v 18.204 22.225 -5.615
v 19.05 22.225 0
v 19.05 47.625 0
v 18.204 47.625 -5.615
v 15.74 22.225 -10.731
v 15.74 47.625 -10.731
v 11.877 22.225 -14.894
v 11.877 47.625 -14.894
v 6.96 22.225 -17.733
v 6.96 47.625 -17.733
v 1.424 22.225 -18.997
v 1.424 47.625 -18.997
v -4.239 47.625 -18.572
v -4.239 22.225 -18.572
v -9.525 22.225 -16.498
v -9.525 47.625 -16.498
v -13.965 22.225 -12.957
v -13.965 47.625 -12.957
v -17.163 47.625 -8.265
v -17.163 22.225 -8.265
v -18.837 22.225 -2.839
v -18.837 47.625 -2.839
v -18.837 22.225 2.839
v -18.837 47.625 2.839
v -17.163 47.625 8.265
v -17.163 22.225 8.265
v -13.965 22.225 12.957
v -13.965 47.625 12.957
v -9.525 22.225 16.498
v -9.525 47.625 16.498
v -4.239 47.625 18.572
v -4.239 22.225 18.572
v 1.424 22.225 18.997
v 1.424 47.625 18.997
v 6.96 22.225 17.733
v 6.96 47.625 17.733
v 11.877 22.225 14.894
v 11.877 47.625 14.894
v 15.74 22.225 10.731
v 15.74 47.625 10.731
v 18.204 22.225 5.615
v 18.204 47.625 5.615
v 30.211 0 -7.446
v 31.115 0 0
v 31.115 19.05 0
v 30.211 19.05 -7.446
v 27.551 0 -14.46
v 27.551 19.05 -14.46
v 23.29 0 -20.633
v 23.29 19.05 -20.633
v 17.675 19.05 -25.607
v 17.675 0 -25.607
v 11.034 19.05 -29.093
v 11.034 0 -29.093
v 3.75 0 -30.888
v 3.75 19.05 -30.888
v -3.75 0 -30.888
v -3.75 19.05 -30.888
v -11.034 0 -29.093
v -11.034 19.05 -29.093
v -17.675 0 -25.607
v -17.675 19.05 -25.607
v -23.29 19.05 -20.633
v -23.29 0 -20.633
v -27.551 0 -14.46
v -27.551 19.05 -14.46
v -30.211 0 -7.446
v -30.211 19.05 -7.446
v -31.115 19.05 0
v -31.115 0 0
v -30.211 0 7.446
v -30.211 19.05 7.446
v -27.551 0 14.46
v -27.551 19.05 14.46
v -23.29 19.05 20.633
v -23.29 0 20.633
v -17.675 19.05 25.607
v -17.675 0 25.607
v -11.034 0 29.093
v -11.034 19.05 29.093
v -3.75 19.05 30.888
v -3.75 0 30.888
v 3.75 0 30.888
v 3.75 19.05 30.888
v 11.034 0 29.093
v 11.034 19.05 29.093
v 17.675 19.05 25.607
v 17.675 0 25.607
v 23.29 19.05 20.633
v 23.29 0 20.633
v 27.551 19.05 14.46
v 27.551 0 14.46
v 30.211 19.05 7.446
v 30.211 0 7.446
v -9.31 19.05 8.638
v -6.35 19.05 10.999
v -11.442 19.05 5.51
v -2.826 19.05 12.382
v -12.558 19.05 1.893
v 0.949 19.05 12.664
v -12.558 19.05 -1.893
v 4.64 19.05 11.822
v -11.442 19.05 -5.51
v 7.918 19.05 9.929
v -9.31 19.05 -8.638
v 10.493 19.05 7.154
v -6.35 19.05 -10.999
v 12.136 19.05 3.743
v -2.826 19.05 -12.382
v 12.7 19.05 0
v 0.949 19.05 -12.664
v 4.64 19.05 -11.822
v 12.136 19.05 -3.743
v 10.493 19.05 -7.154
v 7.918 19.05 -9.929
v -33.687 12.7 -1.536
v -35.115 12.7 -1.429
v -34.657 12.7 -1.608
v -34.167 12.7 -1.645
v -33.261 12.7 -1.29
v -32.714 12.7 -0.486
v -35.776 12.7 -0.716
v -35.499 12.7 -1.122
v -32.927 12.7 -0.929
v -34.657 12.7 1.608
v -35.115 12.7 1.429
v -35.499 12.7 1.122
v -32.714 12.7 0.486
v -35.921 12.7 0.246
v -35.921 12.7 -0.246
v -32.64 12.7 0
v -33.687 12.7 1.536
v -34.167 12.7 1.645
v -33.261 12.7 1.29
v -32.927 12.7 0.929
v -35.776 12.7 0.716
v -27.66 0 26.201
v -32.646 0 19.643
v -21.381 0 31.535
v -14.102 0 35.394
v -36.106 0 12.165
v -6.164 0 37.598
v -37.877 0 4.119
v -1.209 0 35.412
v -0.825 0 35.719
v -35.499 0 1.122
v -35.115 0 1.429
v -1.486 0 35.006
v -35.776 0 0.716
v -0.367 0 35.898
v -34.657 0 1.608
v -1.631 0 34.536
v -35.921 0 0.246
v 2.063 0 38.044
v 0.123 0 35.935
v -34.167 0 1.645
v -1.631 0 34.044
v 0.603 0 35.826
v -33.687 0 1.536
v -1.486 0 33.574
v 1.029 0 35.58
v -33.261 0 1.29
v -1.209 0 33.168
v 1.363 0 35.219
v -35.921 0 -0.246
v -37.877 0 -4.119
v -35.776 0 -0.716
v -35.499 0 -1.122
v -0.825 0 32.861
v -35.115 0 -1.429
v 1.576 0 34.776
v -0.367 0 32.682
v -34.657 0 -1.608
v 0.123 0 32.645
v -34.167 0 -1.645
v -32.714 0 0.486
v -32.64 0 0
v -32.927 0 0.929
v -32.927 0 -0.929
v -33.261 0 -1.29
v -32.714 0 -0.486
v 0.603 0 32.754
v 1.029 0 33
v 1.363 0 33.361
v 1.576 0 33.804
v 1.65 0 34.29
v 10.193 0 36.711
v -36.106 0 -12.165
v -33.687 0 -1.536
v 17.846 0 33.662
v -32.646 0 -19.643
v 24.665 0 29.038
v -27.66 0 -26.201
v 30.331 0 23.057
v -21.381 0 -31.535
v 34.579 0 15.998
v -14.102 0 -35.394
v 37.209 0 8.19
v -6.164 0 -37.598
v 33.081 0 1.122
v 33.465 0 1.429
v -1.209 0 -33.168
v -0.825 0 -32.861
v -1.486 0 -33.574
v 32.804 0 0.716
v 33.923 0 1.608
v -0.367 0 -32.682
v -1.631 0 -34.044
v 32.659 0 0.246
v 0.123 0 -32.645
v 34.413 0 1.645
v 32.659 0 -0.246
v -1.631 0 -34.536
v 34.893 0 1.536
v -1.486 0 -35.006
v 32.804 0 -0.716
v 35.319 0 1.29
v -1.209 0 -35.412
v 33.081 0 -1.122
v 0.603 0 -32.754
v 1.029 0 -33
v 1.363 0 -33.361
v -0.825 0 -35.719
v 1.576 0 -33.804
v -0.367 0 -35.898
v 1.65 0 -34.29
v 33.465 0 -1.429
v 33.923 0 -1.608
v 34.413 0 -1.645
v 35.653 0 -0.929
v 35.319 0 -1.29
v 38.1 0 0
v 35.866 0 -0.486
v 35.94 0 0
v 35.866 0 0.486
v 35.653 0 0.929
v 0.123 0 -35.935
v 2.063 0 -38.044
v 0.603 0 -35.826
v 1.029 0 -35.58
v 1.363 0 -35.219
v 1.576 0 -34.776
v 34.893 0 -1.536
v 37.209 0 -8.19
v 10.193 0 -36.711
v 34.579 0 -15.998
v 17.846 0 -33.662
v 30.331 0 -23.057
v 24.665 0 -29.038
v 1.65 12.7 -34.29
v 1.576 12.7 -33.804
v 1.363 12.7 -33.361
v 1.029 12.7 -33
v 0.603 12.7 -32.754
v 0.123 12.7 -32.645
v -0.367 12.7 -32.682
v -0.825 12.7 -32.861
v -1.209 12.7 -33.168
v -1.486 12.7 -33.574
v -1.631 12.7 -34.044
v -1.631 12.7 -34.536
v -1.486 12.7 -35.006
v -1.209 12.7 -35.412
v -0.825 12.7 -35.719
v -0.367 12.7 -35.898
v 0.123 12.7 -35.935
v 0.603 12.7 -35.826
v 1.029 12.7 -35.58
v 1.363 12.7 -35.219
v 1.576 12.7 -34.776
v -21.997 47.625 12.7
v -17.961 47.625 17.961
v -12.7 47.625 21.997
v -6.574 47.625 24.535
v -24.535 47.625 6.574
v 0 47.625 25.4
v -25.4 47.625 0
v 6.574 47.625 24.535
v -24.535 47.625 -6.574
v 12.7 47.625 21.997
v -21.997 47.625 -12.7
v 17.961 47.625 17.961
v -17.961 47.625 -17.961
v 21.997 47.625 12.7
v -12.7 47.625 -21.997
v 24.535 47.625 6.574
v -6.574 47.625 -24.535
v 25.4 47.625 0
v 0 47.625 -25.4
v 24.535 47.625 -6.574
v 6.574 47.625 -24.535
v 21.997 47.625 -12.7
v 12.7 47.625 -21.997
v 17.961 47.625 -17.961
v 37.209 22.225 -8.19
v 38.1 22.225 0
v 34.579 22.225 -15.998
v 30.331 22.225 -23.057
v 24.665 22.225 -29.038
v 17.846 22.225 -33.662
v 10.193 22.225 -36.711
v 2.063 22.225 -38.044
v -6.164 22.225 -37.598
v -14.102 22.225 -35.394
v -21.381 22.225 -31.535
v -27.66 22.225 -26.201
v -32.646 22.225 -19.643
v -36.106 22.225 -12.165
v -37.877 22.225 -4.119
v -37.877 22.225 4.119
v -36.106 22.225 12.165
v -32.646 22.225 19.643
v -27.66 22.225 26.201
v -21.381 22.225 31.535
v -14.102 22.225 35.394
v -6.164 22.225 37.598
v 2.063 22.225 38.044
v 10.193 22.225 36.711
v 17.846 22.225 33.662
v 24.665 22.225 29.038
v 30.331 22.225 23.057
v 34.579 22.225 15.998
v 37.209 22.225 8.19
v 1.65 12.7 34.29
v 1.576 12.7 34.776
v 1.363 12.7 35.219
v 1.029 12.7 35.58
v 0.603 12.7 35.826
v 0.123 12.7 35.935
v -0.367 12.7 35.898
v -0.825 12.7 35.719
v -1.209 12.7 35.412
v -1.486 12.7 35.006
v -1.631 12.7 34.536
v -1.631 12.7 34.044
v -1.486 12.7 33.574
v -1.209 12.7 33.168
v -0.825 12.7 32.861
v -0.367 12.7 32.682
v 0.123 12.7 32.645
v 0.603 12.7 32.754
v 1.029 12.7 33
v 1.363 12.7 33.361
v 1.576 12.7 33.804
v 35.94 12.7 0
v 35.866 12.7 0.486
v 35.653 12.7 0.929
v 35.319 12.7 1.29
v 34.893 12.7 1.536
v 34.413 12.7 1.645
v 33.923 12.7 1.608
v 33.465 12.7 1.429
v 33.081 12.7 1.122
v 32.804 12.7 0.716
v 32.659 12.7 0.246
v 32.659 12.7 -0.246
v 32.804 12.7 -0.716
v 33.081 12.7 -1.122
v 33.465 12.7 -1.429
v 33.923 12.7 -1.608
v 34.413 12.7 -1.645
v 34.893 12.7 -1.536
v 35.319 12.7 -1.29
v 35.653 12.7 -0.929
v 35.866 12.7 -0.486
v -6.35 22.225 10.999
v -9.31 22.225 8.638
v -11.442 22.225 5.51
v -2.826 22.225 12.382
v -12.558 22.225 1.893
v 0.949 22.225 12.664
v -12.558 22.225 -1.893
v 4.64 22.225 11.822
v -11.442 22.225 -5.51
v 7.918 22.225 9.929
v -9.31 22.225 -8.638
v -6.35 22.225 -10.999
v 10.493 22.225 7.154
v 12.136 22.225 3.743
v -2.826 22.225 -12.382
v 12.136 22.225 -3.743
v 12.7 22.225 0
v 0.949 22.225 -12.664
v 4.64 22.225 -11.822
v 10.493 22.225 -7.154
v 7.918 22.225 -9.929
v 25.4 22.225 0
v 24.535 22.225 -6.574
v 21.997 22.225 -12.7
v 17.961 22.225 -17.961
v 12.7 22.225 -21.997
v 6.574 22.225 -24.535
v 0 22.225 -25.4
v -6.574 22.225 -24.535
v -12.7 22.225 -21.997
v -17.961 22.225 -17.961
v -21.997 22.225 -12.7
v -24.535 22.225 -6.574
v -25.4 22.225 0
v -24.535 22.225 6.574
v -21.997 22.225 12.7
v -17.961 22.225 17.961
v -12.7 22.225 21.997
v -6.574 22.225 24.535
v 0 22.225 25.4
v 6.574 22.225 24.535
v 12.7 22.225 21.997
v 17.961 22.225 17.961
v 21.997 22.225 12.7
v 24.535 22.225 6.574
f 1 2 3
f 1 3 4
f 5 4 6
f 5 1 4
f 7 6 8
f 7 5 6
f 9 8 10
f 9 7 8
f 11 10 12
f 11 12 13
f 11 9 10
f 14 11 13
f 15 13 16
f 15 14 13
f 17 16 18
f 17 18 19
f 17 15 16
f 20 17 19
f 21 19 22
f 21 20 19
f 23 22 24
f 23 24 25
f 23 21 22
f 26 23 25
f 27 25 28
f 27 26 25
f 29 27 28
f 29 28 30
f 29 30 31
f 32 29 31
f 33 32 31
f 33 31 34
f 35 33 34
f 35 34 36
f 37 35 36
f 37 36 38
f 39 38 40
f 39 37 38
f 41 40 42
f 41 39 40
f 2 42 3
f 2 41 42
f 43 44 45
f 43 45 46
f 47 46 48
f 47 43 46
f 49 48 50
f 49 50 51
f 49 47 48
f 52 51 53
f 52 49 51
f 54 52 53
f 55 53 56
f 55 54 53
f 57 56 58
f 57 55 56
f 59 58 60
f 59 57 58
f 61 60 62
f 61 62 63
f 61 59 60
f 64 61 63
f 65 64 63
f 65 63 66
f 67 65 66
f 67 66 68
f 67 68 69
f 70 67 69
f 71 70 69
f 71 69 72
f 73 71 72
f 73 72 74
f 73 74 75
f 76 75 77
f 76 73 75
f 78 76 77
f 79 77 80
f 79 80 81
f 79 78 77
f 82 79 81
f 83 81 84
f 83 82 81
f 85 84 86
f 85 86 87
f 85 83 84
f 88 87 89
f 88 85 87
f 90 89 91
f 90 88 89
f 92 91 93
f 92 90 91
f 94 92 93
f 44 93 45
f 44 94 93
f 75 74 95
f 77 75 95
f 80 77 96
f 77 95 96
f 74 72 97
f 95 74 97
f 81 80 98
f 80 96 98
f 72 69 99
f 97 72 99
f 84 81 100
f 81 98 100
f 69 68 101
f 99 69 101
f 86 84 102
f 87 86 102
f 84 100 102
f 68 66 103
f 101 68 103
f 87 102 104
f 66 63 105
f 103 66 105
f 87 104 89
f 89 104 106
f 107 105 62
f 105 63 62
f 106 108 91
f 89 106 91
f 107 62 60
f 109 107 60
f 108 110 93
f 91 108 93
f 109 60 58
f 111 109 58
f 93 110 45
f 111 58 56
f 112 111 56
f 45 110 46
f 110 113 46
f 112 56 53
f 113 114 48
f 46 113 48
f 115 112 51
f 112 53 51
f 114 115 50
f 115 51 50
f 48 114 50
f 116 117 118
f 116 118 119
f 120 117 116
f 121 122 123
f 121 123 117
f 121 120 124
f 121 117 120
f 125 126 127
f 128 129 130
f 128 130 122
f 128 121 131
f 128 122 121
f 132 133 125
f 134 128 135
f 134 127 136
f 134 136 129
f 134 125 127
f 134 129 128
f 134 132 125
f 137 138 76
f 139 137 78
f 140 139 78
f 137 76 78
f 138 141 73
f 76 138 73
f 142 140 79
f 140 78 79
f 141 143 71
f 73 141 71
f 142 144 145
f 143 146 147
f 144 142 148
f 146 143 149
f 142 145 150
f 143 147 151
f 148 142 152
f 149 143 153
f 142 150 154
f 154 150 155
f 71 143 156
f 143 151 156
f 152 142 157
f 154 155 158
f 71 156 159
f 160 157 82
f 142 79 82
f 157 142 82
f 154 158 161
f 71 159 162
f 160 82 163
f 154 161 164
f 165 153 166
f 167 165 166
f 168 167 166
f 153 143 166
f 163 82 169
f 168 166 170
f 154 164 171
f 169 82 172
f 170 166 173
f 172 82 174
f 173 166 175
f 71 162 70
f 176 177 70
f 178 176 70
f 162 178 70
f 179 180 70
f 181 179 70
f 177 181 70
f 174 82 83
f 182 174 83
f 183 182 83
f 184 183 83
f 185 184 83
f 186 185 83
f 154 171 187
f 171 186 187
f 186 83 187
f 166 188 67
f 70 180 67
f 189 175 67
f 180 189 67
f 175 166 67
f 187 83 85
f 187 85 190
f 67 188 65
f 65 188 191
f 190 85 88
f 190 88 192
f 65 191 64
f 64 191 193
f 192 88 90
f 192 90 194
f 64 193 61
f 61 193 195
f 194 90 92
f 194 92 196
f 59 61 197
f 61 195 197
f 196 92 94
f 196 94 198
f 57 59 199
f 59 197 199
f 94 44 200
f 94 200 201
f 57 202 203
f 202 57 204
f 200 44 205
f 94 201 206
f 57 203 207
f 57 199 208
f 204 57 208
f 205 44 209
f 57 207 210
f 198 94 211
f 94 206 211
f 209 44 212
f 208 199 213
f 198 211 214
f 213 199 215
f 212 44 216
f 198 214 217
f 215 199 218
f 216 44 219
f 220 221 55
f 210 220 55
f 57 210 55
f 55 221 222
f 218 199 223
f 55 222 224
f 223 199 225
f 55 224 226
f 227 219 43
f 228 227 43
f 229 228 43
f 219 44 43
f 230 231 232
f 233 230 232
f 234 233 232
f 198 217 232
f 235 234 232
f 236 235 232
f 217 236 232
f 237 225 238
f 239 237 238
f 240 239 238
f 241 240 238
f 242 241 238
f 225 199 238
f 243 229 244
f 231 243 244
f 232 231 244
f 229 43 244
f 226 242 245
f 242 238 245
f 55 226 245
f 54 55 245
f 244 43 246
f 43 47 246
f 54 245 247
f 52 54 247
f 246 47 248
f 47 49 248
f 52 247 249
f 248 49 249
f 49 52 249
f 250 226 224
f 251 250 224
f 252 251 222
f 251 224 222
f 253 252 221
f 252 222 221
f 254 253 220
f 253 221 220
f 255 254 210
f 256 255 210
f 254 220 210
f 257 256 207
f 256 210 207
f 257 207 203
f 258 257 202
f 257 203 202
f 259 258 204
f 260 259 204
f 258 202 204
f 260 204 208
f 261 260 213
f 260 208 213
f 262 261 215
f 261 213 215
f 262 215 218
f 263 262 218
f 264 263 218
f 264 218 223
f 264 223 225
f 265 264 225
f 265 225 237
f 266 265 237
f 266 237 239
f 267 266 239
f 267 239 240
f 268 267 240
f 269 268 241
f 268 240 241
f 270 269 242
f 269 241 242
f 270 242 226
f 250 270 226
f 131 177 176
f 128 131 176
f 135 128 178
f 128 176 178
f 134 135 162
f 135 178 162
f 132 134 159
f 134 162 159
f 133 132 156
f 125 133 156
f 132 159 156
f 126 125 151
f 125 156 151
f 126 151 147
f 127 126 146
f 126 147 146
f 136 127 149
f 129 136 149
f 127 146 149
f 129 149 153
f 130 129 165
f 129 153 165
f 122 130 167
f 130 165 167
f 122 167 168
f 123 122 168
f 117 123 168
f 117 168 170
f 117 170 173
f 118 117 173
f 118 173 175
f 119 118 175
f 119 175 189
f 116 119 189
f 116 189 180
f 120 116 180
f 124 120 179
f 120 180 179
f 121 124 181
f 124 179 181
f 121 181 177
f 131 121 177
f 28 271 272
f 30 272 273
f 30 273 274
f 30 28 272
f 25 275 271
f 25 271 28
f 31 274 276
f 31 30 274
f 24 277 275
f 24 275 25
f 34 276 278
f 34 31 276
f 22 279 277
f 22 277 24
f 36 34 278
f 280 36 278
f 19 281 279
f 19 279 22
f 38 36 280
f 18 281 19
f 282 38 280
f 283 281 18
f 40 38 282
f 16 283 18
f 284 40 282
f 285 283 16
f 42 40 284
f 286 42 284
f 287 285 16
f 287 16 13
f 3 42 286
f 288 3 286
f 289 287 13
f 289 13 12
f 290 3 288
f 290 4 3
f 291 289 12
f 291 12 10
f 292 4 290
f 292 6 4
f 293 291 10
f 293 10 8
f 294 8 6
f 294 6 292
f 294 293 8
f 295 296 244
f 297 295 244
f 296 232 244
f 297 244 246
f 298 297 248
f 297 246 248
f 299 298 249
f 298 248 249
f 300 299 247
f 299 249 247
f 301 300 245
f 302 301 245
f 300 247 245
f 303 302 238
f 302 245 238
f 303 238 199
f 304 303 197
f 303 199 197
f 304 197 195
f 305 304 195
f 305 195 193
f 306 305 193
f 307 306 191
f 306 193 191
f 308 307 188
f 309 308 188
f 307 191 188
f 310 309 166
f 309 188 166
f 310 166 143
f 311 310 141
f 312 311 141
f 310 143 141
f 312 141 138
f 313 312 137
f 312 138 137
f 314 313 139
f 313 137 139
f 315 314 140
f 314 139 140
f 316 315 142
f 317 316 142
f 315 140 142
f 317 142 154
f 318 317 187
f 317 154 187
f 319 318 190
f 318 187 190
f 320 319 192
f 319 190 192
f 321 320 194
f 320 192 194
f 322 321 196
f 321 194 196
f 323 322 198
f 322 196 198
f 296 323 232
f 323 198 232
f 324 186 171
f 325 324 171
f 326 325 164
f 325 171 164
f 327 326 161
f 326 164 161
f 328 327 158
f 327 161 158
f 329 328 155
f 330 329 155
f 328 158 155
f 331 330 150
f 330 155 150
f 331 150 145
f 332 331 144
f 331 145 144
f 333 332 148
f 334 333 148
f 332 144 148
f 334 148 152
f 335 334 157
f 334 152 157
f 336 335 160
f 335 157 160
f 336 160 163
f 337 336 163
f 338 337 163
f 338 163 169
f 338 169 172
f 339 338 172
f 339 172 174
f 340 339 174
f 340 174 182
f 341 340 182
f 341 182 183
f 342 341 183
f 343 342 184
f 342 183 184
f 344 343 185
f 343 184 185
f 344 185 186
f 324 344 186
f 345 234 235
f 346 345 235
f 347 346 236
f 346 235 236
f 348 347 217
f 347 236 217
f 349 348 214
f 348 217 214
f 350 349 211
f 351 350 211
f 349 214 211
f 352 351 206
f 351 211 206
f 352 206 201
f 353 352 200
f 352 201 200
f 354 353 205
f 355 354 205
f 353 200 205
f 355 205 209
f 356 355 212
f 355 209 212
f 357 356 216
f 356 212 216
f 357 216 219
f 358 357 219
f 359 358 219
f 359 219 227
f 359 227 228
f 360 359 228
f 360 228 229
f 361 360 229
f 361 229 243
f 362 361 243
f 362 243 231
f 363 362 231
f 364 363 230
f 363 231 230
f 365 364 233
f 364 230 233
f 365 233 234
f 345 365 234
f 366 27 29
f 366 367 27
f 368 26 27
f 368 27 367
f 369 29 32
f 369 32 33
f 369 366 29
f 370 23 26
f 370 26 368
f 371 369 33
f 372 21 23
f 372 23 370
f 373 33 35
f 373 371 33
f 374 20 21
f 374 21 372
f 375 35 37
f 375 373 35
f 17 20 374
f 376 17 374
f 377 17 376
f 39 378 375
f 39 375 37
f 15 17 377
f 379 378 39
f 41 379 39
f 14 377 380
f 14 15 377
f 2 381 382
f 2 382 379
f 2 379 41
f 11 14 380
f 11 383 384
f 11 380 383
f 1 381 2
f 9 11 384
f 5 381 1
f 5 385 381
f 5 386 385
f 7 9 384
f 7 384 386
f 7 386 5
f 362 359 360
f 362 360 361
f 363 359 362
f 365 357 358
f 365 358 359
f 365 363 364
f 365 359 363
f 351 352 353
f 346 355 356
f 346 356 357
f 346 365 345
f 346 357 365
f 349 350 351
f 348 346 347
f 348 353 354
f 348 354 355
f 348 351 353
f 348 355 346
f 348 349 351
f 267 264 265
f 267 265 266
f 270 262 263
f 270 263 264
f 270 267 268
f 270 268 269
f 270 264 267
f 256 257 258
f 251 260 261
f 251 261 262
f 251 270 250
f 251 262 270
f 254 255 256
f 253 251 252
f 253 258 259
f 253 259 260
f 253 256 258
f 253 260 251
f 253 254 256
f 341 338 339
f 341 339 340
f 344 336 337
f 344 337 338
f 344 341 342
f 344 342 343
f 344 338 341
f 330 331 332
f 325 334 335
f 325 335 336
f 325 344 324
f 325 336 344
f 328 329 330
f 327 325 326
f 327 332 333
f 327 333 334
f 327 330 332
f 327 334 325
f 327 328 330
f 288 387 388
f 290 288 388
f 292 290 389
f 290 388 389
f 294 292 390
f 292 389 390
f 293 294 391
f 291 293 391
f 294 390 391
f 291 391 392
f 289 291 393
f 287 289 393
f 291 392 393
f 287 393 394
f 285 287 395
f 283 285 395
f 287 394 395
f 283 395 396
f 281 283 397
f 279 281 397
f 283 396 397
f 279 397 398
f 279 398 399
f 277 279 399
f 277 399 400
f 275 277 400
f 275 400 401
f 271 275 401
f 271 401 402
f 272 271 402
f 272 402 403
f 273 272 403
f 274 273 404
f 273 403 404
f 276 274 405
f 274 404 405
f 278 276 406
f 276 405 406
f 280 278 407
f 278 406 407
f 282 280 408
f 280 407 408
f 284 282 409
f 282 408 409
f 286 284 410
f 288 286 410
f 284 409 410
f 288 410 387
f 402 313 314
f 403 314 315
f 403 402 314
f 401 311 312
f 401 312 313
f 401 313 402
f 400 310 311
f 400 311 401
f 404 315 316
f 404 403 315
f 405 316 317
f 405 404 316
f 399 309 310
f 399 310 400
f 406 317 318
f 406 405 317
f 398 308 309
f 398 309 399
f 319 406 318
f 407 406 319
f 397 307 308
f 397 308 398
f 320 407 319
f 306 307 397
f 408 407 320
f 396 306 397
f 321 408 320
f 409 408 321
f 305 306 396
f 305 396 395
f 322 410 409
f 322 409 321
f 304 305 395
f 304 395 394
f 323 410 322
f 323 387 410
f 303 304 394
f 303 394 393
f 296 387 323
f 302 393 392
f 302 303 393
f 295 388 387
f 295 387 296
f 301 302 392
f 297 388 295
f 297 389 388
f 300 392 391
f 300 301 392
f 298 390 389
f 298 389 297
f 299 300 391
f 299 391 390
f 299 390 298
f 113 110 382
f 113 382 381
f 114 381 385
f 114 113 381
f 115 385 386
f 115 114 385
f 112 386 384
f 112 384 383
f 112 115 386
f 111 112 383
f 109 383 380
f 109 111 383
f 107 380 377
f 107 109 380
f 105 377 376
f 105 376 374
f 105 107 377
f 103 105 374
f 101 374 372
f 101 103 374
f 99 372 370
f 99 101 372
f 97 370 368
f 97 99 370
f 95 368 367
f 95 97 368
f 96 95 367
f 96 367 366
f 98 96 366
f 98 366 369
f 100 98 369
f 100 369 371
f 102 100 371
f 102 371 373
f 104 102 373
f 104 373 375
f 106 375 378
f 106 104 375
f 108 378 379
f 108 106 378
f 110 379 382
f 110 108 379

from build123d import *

# Parameters (mm, degrees)
SKETCH1_R           = 38.1
SKETCH1_R_2         = 31.115
BOSS_EXTRUDE1_DEPTH = 19.05
SKETCH2_R           = 1.64973
CUT_EXTRUDE1_DEPTH  = 12.7
SKETCH3_R           = 38.1
SKETCH3_R_2         = 12.7
BOSS_EXTRUDE2_DEPTH = 3.175
SKETCH4_R           = 25.4
SKETCH4_R_2         = 19.05
BOSS_EXTRUDE3_DEPTH = 25.4


with BuildPart() as part:
    # Sketch1 → Boss-Extrude1 (new body)
    with BuildSketch(Plane(origin=(0, 0, 0), x_dir=(1, 0, 0), z_dir=(0, 1, 0))):
        Circle(SKETCH1_R)
        Circle(SKETCH1_R_2, mode=Mode.SUBTRACT)
    extrude(amount=BOSS_EXTRUDE1_DEPTH)

    # Sketch2 → Cut-Extrude1 (cut)
    with BuildSketch(Plane.XZ):
        with Locations((0, 34.29)):
            Circle(SKETCH2_R)
        with Locations((34.29, 0)):
            Circle(SKETCH2_R)
        with Locations((0, -34.29)):
            Circle(SKETCH2_R)
        with Locations((-34.29, 0)):
            Circle(SKETCH2_R)
    extrude(amount=-CUT_EXTRUDE1_DEPTH, mode=Mode.SUBTRACT)

    # Sketch3 → Boss-Extrude2 (add)
    with BuildSketch(Plane(origin=(0, 19.05, 0), x_dir=(1, 0, 0), z_dir=(0, 1, 0))):
        Circle(SKETCH3_R)
        Circle(SKETCH3_R_2, mode=Mode.SUBTRACT)
    extrude(amount=BOSS_EXTRUDE2_DEPTH)

    # Sketch4 → Boss-Extrude3 (add)
    with BuildSketch(Plane(origin=(0, 22.225, 0), x_dir=(1, 0, 0), z_dir=(0, 1, 0))):
        Circle(SKETCH4_R)
        Circle(SKETCH4_R_2, mode=Mode.SUBTRACT)
    extrude(amount=BOSS_EXTRUDE3_DEPTH)


solid = part.part
